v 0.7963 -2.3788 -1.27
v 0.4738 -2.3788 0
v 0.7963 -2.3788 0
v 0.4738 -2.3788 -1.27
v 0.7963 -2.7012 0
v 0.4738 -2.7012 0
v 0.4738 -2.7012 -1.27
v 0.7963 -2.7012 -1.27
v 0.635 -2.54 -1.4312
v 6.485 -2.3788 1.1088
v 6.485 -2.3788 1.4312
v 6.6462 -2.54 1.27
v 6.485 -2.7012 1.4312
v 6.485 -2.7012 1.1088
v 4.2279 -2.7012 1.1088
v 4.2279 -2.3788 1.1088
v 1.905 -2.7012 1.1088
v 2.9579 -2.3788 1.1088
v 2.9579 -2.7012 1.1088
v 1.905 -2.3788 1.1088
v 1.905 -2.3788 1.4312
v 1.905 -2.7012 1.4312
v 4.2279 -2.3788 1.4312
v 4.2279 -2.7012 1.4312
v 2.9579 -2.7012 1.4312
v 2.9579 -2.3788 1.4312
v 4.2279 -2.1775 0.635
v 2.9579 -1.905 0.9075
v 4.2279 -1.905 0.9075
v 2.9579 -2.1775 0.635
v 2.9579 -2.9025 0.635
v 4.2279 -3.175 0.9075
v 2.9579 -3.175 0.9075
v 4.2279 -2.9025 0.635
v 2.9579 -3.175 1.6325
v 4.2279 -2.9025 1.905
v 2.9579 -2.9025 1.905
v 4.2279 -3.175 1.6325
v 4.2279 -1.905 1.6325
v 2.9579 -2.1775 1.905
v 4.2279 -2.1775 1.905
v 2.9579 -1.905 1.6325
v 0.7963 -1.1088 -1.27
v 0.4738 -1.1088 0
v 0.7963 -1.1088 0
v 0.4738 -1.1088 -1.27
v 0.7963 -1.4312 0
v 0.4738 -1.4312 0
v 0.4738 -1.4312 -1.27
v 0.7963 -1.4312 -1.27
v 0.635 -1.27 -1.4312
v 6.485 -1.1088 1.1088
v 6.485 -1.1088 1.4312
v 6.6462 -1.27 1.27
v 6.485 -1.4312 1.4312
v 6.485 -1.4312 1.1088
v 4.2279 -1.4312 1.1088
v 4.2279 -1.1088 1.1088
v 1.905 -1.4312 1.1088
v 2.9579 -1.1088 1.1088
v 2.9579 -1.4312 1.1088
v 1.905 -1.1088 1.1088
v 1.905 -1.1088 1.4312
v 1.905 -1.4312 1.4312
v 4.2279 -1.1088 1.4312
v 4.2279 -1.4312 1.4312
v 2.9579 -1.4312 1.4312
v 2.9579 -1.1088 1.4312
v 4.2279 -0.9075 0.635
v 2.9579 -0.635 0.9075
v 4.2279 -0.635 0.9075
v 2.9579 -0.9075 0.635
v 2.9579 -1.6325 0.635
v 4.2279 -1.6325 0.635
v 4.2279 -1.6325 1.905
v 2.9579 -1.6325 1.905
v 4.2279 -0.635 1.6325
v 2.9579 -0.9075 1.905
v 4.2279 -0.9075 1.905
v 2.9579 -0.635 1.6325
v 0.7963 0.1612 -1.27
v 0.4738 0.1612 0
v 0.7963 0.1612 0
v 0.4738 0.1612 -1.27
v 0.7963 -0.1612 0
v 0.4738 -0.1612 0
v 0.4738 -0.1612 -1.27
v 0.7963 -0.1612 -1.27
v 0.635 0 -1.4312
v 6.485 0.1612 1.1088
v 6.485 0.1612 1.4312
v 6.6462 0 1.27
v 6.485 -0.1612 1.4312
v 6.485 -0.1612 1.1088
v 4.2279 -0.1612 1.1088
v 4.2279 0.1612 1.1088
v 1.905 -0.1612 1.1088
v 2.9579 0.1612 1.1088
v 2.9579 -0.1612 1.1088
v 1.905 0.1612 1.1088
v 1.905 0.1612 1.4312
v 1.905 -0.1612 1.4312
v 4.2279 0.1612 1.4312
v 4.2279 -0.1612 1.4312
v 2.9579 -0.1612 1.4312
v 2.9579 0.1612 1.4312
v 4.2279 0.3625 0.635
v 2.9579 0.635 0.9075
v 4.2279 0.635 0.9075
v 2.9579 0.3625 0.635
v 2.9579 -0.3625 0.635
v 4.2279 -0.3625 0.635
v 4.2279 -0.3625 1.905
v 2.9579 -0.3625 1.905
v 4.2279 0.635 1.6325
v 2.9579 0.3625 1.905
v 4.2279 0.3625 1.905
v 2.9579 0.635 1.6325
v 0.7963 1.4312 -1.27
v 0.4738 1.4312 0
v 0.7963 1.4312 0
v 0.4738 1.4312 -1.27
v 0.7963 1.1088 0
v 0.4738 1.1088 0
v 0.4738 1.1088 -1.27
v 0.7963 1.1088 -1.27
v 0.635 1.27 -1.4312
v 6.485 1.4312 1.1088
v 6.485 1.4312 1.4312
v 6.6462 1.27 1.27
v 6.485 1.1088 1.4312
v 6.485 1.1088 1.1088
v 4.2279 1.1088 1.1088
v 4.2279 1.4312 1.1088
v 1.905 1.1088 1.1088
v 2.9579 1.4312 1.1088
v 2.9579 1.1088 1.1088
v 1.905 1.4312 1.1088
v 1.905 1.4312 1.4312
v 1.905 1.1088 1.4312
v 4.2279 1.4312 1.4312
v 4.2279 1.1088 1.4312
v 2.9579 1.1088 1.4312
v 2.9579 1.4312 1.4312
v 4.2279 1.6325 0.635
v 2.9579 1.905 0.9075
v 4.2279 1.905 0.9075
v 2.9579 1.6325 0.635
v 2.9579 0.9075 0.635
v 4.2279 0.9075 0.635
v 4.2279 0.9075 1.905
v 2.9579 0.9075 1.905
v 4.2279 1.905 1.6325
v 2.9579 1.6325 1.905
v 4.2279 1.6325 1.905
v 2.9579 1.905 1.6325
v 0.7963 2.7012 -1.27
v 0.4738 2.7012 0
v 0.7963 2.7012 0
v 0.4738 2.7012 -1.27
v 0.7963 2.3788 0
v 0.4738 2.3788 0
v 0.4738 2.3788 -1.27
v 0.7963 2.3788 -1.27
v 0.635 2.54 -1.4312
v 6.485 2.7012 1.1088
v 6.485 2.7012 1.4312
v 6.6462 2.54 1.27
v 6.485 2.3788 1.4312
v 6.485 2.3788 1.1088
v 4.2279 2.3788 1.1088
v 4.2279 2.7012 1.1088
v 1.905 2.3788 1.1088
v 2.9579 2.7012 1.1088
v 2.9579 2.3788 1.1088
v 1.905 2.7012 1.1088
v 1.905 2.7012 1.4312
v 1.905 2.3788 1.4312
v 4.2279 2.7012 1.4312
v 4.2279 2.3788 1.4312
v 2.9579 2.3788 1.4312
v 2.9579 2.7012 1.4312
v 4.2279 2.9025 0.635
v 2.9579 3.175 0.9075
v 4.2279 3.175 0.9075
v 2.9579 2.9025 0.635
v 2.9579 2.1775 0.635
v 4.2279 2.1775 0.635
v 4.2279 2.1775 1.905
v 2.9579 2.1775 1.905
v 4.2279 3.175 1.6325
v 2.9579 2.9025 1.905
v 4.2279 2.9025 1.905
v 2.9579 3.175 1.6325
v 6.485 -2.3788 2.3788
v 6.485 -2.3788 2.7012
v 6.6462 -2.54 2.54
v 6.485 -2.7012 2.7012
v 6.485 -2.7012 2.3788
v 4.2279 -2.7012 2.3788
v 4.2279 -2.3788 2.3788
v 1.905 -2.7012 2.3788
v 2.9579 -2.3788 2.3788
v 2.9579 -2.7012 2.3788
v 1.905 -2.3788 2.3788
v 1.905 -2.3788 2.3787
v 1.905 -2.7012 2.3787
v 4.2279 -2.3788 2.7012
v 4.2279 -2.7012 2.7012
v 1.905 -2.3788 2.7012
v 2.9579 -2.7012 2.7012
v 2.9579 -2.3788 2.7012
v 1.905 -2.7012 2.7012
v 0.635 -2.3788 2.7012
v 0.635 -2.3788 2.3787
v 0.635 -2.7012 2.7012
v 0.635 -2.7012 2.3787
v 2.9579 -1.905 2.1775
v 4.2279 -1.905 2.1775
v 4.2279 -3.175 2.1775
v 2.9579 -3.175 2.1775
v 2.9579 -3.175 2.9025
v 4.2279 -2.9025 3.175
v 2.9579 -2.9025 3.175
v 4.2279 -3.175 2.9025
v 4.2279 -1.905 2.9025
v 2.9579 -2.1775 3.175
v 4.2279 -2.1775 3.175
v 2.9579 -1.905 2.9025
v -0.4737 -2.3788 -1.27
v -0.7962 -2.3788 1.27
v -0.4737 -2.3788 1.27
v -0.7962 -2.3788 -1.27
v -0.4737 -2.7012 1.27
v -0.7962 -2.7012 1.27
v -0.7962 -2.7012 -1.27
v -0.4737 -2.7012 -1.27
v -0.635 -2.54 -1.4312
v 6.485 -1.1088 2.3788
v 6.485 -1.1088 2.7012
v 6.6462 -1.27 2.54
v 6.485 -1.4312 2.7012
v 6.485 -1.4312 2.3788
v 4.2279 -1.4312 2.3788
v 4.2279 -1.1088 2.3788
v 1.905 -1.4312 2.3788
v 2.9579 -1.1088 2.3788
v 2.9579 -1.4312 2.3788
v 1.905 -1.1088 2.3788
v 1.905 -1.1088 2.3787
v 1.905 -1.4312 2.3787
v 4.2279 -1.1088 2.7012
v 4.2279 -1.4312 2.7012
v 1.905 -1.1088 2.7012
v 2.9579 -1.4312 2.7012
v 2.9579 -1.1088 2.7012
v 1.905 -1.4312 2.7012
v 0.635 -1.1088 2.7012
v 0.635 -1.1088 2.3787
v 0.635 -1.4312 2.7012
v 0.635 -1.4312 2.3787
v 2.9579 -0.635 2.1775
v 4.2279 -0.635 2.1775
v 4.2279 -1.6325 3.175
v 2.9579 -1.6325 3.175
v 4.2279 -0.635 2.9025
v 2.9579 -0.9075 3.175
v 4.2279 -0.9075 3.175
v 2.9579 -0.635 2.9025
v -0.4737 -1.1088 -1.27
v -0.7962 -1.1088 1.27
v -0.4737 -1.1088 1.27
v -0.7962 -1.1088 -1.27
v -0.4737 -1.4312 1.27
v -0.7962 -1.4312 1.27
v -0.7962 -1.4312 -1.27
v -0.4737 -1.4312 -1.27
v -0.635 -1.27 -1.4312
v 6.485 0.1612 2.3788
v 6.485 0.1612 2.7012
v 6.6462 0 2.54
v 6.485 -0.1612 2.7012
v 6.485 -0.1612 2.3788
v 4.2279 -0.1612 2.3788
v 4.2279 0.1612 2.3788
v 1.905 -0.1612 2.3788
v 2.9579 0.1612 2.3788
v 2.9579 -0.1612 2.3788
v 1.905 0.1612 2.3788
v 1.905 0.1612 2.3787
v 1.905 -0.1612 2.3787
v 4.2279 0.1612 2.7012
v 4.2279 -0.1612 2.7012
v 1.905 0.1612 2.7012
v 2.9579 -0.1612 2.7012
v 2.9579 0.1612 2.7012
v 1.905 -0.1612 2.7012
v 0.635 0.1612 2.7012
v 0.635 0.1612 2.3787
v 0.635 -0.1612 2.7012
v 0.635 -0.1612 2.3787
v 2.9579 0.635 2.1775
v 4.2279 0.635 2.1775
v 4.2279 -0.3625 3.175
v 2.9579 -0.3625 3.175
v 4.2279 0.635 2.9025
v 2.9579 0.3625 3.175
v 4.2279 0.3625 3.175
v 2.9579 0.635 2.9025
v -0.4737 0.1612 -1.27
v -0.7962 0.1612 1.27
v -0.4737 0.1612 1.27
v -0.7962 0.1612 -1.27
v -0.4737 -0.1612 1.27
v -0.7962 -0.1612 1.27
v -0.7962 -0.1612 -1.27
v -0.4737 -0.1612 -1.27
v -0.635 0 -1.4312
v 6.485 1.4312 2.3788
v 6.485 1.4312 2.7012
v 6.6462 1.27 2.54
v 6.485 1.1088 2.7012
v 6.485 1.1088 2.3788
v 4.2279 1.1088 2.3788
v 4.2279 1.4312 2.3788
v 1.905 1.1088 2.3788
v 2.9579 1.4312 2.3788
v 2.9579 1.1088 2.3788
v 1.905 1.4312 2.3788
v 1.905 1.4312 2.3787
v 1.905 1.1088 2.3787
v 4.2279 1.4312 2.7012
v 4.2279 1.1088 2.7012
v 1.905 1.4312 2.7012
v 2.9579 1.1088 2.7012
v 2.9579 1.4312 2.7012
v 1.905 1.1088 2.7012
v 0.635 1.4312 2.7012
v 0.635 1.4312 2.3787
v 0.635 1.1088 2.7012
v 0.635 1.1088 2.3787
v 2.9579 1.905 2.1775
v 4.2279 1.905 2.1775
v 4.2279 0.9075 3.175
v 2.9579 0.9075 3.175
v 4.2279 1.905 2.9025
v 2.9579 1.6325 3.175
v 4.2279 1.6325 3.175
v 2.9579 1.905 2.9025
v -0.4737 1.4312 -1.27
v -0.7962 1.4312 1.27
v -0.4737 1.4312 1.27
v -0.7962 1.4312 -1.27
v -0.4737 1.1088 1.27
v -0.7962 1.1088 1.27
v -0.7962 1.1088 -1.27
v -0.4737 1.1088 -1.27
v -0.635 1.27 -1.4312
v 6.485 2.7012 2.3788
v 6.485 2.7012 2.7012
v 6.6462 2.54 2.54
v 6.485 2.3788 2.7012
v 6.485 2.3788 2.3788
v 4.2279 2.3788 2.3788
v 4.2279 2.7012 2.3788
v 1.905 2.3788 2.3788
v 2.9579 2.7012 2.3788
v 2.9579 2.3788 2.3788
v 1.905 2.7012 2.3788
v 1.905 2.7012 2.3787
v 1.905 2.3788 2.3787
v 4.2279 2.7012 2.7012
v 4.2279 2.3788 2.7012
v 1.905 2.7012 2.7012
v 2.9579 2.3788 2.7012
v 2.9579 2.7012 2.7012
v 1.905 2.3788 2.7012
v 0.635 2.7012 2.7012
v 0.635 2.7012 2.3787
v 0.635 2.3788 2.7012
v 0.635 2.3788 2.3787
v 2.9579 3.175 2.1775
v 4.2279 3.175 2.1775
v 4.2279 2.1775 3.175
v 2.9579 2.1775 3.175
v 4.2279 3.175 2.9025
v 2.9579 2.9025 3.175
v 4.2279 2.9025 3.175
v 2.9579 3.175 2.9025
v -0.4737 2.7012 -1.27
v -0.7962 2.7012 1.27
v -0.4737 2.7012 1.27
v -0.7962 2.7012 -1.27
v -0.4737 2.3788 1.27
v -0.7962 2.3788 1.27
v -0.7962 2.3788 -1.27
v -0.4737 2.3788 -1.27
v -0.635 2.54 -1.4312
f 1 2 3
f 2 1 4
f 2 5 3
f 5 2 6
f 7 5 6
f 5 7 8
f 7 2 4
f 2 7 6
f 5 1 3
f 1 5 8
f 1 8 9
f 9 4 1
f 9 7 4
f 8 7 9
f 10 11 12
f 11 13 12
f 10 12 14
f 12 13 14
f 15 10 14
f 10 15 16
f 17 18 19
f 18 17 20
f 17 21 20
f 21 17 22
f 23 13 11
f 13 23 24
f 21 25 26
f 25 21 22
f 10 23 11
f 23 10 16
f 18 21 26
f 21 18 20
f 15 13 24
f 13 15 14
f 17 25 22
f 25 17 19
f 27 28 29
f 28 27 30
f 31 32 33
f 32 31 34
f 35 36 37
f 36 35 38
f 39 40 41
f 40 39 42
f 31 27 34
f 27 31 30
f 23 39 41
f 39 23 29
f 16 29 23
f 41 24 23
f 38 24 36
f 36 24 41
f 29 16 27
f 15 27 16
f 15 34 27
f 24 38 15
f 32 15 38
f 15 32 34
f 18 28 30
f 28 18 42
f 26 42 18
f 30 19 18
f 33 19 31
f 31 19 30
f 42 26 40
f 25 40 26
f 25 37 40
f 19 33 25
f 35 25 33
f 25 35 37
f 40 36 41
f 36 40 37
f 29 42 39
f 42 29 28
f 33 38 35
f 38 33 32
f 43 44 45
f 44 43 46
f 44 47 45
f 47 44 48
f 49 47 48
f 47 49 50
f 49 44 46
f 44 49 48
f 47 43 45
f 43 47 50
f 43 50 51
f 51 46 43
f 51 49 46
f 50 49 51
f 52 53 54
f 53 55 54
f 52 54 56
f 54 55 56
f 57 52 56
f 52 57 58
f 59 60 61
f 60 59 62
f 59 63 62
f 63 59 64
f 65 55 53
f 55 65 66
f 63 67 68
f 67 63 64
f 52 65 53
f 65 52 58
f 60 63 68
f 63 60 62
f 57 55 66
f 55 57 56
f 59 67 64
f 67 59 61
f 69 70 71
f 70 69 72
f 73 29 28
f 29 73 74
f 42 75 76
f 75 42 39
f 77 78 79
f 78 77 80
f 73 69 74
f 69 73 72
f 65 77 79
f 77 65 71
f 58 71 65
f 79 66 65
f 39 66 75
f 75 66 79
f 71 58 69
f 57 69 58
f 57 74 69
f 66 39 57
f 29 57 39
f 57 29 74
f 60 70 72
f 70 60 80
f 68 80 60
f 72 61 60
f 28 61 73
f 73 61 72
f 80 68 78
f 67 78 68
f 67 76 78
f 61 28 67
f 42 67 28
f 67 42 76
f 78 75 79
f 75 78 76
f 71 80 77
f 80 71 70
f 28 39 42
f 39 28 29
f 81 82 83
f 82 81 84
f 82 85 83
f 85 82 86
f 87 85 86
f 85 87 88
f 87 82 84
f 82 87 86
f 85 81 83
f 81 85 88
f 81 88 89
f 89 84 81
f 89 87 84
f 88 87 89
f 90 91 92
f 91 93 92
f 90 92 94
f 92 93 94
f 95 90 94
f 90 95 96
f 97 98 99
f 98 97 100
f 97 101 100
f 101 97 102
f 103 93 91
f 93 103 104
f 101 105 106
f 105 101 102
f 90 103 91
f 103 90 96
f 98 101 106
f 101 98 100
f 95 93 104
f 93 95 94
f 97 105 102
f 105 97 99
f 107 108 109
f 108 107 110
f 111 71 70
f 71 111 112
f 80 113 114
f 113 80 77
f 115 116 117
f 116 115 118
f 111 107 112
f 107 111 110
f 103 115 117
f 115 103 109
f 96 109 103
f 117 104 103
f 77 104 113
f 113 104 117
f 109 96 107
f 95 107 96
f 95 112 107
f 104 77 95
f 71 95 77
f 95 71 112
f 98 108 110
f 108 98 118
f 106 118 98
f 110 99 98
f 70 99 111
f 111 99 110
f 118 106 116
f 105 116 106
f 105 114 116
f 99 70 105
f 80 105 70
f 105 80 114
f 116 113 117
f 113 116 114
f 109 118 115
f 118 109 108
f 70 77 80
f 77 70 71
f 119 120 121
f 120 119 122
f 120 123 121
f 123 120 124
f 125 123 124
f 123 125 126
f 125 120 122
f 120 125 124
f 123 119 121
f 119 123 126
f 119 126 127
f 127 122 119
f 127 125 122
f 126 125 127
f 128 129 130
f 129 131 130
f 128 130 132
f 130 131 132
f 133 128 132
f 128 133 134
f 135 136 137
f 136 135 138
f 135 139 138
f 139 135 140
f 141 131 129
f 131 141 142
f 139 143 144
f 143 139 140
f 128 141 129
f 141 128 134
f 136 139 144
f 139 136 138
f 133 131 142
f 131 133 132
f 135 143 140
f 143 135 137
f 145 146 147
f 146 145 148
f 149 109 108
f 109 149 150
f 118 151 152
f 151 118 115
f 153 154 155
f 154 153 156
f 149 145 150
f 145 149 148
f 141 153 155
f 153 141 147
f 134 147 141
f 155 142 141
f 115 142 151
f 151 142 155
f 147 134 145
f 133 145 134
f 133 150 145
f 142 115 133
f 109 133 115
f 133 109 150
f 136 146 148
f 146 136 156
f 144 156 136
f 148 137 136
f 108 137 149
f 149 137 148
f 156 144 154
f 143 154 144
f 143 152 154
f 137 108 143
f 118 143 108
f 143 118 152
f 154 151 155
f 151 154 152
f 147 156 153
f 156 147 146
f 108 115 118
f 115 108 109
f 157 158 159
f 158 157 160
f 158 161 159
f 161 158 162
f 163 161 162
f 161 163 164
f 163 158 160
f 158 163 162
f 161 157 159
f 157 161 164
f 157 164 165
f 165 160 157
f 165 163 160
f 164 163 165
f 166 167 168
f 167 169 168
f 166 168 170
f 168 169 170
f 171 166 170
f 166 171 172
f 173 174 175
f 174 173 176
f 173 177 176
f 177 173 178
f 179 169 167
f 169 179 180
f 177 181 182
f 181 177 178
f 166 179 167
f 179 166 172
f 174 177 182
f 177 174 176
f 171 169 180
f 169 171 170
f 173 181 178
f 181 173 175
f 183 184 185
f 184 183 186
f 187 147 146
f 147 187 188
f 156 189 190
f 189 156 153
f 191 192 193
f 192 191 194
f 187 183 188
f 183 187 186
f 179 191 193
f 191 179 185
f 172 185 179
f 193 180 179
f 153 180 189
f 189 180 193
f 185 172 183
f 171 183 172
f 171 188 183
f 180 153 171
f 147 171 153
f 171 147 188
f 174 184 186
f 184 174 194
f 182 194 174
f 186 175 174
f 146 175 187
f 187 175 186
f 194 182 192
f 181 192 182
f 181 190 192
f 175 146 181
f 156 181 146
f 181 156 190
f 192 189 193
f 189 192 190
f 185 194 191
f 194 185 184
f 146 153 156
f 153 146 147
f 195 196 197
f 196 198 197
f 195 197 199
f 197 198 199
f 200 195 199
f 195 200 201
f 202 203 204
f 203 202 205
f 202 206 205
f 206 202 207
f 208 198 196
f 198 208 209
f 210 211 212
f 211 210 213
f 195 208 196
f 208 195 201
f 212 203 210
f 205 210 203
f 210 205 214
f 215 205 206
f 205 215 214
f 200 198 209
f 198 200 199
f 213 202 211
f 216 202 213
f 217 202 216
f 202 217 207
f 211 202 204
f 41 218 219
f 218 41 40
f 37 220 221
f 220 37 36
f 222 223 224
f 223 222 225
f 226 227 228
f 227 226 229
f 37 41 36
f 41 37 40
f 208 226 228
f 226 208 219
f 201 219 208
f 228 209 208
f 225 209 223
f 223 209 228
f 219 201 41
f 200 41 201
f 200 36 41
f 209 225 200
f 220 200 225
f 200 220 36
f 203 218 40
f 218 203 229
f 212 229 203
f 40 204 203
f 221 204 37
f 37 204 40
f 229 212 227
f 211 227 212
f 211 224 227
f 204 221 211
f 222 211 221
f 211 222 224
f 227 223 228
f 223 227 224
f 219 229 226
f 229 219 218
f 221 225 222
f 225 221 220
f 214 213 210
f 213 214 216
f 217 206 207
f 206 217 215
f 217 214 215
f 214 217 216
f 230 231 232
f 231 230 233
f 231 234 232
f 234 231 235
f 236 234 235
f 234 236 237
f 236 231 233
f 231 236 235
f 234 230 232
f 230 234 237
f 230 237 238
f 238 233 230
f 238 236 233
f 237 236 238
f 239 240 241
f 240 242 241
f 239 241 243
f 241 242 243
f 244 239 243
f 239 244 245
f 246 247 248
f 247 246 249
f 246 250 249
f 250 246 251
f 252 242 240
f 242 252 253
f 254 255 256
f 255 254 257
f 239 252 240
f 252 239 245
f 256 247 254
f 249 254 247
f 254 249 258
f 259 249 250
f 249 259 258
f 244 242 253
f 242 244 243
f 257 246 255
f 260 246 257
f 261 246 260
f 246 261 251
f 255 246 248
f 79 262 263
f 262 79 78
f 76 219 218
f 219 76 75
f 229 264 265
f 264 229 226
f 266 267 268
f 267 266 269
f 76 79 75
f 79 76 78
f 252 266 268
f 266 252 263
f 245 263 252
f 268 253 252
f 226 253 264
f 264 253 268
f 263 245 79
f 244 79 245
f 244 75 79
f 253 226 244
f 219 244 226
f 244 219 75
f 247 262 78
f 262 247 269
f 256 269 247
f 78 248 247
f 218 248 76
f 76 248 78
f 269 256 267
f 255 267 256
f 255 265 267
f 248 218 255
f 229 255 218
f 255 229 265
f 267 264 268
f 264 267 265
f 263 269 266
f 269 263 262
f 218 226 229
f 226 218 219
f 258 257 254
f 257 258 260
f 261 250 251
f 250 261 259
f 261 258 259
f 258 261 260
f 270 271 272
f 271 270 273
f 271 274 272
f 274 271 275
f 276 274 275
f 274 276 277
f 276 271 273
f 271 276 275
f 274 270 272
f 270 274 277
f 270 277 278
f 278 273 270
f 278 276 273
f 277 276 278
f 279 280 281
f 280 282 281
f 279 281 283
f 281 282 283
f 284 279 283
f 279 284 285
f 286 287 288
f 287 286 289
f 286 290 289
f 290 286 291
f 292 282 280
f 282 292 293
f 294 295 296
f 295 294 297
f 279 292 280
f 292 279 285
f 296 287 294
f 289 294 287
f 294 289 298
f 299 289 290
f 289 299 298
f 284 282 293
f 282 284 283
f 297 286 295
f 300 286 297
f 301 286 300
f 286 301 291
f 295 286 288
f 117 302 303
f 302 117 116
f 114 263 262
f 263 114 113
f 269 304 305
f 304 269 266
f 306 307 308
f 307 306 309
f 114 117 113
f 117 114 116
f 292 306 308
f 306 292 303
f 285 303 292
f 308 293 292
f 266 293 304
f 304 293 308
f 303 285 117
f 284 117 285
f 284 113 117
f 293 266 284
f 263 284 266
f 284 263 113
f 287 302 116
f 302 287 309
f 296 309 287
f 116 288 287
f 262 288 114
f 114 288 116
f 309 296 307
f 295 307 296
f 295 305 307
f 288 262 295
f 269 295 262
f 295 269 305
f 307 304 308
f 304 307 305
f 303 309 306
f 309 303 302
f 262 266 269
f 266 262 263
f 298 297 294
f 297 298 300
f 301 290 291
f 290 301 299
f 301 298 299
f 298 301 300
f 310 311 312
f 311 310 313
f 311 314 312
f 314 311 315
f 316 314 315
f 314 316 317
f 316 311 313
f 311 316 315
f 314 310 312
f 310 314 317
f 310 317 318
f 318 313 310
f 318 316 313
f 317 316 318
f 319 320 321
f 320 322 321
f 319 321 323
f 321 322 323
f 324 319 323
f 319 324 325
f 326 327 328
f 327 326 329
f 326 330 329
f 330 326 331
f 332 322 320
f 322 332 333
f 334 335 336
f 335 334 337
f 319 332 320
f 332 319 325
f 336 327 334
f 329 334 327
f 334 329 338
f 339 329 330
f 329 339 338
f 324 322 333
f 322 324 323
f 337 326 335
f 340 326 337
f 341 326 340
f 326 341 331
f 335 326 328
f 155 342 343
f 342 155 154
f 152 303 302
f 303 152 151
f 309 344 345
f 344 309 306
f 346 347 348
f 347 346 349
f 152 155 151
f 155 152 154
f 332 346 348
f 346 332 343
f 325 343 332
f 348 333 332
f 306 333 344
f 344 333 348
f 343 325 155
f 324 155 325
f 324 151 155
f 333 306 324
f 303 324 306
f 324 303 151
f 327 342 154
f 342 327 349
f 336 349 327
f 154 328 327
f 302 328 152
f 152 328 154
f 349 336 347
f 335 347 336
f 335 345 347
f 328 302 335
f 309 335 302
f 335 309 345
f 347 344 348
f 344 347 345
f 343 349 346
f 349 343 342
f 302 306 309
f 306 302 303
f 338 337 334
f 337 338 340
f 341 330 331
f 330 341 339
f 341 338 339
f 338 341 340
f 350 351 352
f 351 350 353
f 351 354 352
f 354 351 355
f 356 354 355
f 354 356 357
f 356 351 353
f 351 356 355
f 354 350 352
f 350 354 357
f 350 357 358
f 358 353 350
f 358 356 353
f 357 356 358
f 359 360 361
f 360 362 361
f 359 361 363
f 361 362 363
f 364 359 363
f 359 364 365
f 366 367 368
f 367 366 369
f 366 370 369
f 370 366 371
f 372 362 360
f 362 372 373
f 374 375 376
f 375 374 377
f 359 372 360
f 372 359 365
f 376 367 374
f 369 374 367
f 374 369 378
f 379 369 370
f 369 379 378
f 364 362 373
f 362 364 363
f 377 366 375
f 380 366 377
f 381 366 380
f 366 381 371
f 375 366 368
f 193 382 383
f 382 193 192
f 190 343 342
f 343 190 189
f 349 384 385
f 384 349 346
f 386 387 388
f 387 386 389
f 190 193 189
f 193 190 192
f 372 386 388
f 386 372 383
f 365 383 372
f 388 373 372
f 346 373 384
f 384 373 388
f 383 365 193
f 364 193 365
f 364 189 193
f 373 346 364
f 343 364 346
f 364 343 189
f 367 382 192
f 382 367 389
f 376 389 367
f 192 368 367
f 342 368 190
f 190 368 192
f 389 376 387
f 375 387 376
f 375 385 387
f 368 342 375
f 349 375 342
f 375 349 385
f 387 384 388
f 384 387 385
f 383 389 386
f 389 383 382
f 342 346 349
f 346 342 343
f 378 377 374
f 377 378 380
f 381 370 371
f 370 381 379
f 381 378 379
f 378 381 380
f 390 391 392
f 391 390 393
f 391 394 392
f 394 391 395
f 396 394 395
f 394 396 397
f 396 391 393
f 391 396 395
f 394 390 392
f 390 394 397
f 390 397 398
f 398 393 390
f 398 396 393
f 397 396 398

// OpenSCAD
//Customizable angle header
angle_header(rows=5,cols=2,pitch=1.27);

module angle_header(rows,cols,pitch){
    offsety=((cols+1)*pitch)-((cols+1)*pitch)/2;
    offsetx=-1*((rows-1)/2*pitch);
    rotate([0,90,0])
    translate([0,offsetx,offsety])
    union(){
        for(j=[0:1:cols-1]){
            translate([-1*pitch*j,0,0])
            for(i=[0:1:rows-1]){
                translate([0,pitch*i,0])angle_pin(pitch,j);
            }
        }
    }
}
module angle_pin(pitch=2.54,col=0){
    rotate([90,0,0])corner(r=pitch, s=pitch, p=pitch,column=col);
    translate([-pitch,0,0])h_pin(p=pitch);
}
module corner(r=1,s=1,p=2.54,column=0){
    s=p/4+0.005;
    w=(r<1)?1:r*2;
    h=p*4-0.5;
    d=s/2;
    if(column==0){
        translate([0,-1*(p+d),d])rotate([0,90,0])cube([s,s,p],center=false);
        translate([p,-p,0])rotate([0,-90,0])mirror([0,0,d])
        rotate([0,0,45])cylinder($fn=4,r1=sqrt(2*pow(d,2)),r2=0,h=d,center=false);
        
        difference(){
            rotate_extrude($fn=100,angle=90)translate([r,0,0])square(s,center=true);
            translate([0,0,-0.1])
            union(){
                translate([0,0,-1])cube([w+0.1,w+0.1,w]);
                translate([0,-w,-1])cube([w+0.1,w+0.1,w]);
                translate([-w,0,-1])cube([w+0.1,w+0.1,w]);
            }
        }
        translate([0,-1*(p+d),d])rotate([0,90,0])cube([s,s,p],center=false);
        translate([p,-p,0])
        rotate([0,-90,0])
        mirror([0,0,d])
        rotate([0,0,45])cylinder($fn=4,r1=sqrt(2*pow(d,2)),r2=0,h=d,center=false);   
    }else{
        translate([-1*(p+d),0,-d])rotate([90,0,0])cube([s,s,p*column],center=false);
        translate([0,-column*p,0])
        difference(){
            rotate_extrude($fn=100,angle=90)translate([r,0,0])square(s,center=true);
            translate([0,0,-0.1])
            union(){
                translate([0,0,-1])cube([w+0.1,w+0.1,w]);
                translate([0,-w,-1])cube([w+0.1,w+0.1,w]);
                translate([-w,0,-1])cube([w+0.1,w+0.1,w]);
            }
        }
        translate([0,-1*(column+1)*p-d,d])rotate([0,90,0])
        cube([s,s,(column+1)*p],center=false);
        translate([(column+1)*p,-1*(column+1)*p,0])
        rotate([0,-90,0])mirror([0,0,d])rotate([0,0,45])
        cylinder($fn=4,r1=sqrt(2*pow(d,2)),r2=0,h=d,center=false);
    }
}
module h_pin(p=2.54){
    s=p/4+0.005;
    h=p*4-0.5;
    base=h/3;
    d=s/2;
    union(){
        color("gold")union(){
            translate([0,0,h])rotate([0,0,45])
            cylinder($fn=4,r1=sqrt(2*pow(d,2)),r2=0,h=d,center=false);
            translate([-d,-d,0])cube([s,s,h],center=false);
        }
       color("Dimgray")difference(){
            translate([0,0,base+d])cube([p,p,p],center=true);
            union(){
            translate([1.9*s,1.9*s,base+d])rotate([0,0,45])
                cylinder($fn=3,r=2*d,h=p+1,center=true);
            translate([1.9*s,-1.9*s,base+d-0.15])rotate([0,0,-45])
                cylinder($fn=3,r=2*d,h=p+1,center=true);
            translate([-1.9*s,-1.9*s,base+d-0.3])rotate([0,0,180+45])
                cylinder($fn=3,r=2*d,h=p+1,center=true);
            translate([-1.9*s,1.9*s,base+d-0.3])rotate([0,0,180-45])
                cylinder($fn=3,r=2*d,h=p+1,center=true);
        }
    }
    }
}
